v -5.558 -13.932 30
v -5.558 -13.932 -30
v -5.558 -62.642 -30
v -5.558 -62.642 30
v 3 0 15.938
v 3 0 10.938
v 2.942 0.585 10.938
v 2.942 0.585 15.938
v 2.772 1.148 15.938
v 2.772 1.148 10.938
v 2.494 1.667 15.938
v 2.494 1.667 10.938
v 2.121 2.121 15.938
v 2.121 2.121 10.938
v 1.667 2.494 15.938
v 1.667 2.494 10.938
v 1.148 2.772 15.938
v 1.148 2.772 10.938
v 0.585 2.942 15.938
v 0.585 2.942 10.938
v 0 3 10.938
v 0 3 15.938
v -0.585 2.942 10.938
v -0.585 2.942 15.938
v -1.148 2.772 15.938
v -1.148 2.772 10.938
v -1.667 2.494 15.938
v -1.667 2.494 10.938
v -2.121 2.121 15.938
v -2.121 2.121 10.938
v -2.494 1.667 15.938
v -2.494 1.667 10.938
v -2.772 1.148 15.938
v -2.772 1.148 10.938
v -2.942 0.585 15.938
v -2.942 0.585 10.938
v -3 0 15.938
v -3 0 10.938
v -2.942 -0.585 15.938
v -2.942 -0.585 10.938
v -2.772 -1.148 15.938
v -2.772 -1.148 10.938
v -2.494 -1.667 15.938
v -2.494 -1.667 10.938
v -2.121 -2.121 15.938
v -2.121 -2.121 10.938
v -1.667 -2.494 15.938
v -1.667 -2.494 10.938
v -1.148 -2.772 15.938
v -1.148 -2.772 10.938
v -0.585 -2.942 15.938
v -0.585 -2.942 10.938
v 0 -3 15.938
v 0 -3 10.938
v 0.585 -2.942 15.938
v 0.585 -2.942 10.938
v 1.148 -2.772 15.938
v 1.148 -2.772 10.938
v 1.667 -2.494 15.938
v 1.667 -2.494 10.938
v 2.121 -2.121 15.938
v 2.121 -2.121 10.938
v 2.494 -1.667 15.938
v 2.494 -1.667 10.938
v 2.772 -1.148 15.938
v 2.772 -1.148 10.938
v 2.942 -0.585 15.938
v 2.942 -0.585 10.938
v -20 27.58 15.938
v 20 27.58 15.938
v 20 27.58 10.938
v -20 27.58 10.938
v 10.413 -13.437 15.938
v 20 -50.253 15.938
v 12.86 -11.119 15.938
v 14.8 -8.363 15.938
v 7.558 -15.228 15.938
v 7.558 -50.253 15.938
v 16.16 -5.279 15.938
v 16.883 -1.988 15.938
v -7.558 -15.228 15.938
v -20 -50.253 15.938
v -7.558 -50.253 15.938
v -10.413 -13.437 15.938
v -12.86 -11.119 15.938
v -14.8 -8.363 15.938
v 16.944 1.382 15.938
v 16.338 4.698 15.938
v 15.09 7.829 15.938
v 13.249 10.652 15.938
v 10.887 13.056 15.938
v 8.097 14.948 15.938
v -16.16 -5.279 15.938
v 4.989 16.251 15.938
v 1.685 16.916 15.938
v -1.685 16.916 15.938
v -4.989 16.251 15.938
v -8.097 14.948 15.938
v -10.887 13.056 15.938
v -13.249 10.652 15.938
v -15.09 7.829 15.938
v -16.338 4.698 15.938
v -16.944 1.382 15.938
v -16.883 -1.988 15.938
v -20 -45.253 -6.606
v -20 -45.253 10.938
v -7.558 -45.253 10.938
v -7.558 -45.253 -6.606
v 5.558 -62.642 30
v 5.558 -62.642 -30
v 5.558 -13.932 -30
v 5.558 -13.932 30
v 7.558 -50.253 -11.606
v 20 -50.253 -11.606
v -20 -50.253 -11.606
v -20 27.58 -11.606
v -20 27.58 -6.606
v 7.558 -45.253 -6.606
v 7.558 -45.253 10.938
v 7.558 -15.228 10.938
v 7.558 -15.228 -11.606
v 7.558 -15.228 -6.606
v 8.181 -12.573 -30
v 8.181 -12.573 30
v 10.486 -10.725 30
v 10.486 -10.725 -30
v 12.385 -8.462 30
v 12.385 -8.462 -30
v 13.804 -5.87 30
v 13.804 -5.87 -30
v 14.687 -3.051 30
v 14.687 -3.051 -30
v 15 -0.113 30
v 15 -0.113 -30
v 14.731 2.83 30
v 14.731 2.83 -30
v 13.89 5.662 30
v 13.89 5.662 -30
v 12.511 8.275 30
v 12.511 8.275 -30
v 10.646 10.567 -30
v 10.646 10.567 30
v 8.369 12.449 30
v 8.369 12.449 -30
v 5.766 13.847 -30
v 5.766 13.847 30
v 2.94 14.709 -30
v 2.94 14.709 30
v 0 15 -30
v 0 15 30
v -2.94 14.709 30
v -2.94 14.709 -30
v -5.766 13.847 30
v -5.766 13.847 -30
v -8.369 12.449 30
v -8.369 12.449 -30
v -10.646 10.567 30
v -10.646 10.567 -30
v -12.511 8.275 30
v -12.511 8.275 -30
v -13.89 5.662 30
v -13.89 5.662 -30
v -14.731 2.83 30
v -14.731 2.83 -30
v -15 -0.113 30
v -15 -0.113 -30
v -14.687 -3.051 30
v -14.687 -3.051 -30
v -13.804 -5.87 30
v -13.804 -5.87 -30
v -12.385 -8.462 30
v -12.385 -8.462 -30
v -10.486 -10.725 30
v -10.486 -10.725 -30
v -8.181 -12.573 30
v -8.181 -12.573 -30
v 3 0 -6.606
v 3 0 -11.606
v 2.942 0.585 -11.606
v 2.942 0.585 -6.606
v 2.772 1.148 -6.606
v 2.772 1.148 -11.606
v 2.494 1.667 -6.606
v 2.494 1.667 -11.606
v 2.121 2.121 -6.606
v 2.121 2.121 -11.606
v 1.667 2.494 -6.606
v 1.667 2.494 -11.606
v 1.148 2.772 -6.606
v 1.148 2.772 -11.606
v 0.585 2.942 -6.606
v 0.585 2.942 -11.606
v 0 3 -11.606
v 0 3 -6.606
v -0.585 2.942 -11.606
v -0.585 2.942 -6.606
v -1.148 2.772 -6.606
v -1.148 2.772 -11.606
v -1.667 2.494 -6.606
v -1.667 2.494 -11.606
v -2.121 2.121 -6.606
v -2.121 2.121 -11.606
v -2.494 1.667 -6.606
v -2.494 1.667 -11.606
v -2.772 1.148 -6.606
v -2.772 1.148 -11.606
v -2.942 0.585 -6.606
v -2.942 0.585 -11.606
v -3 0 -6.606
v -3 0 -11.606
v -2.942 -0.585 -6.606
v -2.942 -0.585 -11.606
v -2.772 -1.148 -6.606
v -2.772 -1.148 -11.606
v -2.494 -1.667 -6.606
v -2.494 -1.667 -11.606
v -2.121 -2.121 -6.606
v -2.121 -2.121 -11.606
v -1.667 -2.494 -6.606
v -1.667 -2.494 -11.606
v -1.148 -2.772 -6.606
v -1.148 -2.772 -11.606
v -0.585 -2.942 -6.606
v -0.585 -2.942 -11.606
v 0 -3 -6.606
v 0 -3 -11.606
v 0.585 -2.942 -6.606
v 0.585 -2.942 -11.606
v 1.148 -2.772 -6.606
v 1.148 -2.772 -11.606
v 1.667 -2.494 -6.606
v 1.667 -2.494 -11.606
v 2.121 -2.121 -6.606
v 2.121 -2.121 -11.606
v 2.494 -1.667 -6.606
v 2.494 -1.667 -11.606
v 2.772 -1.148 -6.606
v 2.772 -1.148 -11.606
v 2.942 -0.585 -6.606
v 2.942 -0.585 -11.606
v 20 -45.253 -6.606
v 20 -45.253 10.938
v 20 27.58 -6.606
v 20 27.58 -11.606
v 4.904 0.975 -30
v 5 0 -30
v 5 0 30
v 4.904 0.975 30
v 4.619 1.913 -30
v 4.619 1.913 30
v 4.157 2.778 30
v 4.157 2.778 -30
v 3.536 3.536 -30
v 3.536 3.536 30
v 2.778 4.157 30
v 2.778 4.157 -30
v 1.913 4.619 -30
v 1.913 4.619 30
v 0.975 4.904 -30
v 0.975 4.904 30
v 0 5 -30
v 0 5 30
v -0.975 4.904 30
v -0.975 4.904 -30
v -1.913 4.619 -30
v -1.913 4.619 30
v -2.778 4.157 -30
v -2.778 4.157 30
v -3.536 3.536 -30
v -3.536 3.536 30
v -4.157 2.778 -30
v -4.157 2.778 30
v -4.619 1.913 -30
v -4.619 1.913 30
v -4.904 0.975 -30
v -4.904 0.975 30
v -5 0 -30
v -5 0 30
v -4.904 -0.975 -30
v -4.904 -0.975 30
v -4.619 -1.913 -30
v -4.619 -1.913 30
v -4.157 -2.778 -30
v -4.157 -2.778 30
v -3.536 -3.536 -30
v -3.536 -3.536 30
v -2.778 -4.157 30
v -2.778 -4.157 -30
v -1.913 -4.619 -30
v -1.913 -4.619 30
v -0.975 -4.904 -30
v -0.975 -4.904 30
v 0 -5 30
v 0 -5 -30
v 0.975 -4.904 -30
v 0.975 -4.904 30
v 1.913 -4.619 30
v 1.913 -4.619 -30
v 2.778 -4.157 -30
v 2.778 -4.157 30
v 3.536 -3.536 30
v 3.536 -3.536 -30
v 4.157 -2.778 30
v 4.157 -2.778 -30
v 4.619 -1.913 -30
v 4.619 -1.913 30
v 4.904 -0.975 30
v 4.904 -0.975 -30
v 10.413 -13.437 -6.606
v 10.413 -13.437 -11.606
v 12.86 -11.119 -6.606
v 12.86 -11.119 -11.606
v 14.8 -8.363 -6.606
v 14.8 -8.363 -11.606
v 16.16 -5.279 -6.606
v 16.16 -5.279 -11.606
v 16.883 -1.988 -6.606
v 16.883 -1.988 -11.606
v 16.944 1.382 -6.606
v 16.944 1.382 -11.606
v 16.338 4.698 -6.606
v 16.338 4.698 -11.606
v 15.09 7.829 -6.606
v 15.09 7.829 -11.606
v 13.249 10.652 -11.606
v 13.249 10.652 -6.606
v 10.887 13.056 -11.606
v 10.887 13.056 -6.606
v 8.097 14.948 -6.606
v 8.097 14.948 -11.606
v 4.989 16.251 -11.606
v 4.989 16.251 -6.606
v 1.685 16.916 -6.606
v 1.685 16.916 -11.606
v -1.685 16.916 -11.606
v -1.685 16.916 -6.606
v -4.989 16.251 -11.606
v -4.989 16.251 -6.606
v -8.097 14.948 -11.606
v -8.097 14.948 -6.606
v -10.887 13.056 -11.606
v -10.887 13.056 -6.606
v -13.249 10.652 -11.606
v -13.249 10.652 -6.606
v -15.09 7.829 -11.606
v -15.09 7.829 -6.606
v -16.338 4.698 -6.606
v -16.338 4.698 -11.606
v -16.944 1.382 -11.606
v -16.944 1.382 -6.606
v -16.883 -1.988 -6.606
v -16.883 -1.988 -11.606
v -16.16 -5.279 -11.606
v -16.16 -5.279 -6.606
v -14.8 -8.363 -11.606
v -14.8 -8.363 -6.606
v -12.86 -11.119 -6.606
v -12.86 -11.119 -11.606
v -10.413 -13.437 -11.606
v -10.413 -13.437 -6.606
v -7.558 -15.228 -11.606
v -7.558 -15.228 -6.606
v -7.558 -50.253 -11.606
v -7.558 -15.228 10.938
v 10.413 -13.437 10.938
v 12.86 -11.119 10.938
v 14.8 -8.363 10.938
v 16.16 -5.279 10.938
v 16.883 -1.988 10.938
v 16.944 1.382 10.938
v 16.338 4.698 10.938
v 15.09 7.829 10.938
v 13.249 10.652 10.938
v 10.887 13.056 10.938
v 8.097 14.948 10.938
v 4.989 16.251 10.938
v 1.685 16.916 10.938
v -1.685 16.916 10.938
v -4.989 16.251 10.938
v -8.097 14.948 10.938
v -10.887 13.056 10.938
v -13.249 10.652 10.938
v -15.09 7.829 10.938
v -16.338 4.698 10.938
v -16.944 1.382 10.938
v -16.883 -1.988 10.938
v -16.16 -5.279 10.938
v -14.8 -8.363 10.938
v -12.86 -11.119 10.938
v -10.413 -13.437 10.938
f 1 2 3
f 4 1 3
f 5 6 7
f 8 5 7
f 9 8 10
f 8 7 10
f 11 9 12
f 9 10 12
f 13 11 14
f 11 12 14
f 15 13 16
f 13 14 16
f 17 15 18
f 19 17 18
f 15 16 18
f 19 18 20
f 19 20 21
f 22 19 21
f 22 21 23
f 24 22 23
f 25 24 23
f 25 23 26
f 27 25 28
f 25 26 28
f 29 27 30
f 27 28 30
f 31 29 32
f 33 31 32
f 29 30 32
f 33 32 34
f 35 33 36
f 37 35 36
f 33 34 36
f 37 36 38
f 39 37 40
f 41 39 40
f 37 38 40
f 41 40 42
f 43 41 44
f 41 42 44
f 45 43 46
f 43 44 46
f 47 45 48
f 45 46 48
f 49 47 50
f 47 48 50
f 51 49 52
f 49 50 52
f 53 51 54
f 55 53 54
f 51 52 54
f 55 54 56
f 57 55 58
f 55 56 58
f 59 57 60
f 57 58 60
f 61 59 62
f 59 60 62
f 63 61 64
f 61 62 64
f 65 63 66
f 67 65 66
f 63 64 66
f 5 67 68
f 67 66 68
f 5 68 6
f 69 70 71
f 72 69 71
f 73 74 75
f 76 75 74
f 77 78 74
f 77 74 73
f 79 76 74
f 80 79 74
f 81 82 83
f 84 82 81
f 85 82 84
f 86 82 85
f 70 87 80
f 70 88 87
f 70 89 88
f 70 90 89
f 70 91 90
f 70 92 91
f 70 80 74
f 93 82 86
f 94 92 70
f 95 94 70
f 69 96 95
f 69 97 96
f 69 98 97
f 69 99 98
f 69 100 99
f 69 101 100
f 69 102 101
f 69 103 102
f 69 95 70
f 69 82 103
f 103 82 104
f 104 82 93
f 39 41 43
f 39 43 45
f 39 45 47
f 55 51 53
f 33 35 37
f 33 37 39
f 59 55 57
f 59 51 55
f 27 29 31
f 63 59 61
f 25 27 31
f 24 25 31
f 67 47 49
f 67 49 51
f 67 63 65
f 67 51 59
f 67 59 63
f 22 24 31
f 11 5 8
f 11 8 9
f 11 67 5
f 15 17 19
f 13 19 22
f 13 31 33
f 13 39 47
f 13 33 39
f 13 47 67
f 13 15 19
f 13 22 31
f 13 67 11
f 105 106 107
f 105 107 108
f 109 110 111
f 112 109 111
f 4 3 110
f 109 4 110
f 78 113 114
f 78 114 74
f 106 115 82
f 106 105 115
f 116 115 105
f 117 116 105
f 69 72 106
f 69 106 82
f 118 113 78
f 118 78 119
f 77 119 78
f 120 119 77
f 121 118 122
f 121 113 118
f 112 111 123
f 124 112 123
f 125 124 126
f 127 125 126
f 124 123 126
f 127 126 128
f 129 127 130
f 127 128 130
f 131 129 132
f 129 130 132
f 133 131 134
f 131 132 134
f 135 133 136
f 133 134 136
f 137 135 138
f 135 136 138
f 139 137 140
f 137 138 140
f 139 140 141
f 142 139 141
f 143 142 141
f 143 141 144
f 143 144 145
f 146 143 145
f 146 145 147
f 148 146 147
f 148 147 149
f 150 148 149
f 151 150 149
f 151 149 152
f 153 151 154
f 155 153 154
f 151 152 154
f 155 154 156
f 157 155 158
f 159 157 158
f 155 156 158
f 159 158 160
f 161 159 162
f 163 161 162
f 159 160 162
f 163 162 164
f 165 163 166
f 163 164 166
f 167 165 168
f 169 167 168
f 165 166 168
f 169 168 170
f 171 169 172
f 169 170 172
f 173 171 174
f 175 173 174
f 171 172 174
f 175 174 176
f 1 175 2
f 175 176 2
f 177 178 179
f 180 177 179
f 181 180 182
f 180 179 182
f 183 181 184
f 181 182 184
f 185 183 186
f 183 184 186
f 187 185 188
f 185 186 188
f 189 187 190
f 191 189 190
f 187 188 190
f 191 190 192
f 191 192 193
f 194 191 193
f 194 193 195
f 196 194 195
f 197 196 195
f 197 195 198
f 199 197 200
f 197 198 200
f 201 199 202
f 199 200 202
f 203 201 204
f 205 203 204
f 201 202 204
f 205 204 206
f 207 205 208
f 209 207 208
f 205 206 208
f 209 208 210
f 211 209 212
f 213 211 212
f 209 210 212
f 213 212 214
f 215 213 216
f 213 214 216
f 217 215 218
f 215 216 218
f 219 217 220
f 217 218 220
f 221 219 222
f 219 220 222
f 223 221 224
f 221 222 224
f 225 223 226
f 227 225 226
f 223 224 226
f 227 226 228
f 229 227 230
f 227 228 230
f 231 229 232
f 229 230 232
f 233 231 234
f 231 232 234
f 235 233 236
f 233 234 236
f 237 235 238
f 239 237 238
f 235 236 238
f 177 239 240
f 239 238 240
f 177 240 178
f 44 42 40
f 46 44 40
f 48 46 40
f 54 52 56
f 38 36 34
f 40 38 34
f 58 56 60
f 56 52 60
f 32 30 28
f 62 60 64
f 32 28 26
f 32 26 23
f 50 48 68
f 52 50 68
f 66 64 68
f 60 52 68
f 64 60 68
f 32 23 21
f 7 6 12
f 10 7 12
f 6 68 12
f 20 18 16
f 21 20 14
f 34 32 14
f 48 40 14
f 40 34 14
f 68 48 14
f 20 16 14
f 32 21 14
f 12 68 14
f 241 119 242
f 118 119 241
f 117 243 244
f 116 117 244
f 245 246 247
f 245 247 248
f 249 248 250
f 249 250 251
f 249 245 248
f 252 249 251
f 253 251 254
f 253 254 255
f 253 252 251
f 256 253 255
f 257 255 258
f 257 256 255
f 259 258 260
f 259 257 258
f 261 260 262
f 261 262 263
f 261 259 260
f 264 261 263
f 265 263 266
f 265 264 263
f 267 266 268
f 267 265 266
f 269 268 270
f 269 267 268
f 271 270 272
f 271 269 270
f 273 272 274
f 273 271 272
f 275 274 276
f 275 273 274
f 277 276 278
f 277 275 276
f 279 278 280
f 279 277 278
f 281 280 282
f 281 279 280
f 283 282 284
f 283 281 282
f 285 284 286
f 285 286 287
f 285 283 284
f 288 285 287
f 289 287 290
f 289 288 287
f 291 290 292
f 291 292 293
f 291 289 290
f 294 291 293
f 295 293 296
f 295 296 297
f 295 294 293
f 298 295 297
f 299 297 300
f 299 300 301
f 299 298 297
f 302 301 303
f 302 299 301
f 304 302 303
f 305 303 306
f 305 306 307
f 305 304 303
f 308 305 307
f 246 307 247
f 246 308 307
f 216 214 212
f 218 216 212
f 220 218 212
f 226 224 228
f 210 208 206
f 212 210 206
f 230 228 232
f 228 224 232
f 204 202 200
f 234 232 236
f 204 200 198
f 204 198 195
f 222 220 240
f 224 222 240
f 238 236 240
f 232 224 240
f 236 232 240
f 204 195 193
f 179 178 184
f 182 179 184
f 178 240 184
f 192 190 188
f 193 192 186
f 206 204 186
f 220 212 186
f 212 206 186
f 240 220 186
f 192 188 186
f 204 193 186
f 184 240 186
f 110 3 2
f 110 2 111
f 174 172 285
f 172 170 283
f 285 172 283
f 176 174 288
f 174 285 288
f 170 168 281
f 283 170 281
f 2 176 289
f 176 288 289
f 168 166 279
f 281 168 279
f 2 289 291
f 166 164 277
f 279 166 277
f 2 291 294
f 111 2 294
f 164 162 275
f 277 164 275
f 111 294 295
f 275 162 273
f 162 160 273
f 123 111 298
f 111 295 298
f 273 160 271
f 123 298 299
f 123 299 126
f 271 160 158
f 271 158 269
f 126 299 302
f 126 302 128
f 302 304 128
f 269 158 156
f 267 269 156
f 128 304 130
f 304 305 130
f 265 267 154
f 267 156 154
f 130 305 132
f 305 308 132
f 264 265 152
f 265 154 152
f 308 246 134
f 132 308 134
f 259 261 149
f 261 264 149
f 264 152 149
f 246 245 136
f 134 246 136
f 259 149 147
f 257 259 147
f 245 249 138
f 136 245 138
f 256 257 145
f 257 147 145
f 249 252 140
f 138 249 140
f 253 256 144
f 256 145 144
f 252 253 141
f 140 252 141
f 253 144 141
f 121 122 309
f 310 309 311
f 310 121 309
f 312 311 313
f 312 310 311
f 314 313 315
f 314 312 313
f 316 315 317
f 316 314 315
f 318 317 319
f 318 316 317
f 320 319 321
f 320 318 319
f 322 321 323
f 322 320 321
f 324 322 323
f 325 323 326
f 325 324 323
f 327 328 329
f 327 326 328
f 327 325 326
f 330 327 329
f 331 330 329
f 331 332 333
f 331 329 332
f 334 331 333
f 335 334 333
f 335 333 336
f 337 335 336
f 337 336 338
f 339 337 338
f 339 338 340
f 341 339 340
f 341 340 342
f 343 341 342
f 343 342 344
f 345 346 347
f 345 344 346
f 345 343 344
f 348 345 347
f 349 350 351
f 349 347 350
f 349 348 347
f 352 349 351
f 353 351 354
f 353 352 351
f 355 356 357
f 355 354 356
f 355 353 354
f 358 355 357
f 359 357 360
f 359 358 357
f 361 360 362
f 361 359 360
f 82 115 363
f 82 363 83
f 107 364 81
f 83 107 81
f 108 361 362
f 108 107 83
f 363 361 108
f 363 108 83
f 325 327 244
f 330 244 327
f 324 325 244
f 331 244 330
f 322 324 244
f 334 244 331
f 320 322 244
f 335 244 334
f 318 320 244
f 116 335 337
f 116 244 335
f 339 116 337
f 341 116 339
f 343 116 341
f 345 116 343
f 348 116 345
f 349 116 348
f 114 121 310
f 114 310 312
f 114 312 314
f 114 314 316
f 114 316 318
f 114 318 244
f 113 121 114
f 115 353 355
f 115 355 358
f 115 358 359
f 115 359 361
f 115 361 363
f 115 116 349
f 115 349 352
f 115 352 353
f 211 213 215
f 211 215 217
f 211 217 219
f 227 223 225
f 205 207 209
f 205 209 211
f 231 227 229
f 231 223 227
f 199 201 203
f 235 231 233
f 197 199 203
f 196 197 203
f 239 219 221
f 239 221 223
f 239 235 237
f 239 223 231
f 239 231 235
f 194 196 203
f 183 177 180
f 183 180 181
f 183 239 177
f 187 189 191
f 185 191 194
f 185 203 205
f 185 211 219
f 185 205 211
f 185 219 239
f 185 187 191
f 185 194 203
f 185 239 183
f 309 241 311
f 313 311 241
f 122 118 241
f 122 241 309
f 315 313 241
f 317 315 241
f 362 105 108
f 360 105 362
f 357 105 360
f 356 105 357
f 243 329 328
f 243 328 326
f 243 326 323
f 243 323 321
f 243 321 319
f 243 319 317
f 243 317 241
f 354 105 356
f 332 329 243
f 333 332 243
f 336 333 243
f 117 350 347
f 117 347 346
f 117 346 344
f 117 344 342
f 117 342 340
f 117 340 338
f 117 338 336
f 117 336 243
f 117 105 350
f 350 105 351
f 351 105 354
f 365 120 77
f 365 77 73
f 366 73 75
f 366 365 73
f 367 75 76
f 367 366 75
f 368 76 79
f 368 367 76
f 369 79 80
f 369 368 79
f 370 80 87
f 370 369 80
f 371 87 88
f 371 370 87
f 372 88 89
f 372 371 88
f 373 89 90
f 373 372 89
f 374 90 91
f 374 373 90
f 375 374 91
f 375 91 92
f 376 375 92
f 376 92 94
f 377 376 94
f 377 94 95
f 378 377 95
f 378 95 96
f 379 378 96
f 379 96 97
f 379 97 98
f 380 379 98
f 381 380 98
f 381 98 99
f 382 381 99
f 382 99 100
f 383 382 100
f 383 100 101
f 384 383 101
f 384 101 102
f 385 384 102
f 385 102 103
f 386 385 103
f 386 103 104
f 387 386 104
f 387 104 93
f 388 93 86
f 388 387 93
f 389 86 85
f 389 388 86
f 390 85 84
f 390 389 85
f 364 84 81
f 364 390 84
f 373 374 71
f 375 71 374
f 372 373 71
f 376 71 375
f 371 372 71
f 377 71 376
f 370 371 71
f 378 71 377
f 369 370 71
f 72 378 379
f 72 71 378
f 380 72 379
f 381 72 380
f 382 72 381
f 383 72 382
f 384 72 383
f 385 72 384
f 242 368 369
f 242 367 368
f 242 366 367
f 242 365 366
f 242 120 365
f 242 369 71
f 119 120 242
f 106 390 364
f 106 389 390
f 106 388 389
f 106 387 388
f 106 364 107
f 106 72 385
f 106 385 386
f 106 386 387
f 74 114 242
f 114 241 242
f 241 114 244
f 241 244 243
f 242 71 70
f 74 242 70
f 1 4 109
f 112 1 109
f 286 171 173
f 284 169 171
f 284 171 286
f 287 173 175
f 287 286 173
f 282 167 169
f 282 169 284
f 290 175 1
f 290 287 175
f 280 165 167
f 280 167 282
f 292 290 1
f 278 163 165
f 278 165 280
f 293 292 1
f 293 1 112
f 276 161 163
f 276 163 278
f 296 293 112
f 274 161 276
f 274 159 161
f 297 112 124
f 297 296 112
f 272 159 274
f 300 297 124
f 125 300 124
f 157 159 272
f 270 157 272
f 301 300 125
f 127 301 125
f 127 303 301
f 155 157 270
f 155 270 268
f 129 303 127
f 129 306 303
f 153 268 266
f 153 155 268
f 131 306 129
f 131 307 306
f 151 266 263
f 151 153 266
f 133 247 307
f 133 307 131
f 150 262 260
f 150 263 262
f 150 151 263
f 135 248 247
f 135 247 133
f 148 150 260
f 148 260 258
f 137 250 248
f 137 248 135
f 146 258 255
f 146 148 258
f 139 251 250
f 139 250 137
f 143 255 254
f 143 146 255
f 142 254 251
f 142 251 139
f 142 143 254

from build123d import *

# Parameters (mm, degrees)
EXTRUDE_5_DEPTH      = 30
EXTRUDE_5_DEPTH_BACK = 30
F_1_FR_R             = 5
EXTRUDE_6_DEPTH      = 20
EXTRUDE_6_DEPTH_BACK = 20
OTHER_START          = -11.605501957
OTHER_1_DEPTH        = 27.543632219
OTHER_START_2        = 10.938130262
OTHER_1_2_OUTLINE_R  = 3
OTHER_1_2_DEPTH      = 5
OTHER_1_3_OUTLINE_R  = 3
OTHER_1_3_DEPTH      = 5


# Read off the part's stored shape, not the designer's step: Отступ1
with BuildPart() as part:
    # Эскиз1_fr → Бобышка-Вытянуть5 (new, two sides: drawn at the far end of the back side and taken through both)
    with BuildSketch(Plane.XY.offset(-EXTRUDE_5_DEPTH_BACK)):
        with BuildLine():
            Line((-5.557606452, -13.932444528), (-5.557606452, -62.642280008))
            Line((-5.557606452, -62.642280008), (5.557606452, -62.642280008))
            Line((5.557606452, -62.642280008), (5.557606452, -13.932444528))
            ThreePointArc((5.557606452, -13.932444528), (0, 15), (-5.557606452, -13.932444528))
        make_face()
        Circle(F_1_FR_R, mode=Mode.SUBTRACT)
    extrude(amount=EXTRUDE_5_DEPTH + EXTRUDE_5_DEPTH_BACK)


with BuildPart() as body_2:
    # Эскиз3 → Бобышка-Вытянуть6 (new, two sides: drawn at the far end of the back side and taken through both)
    with BuildSketch(Plane(origin=(0, 0, 0), x_dir=(0, 0, -1), z_dir=(1, 0, 0)).offset(-EXTRUDE_6_DEPTH_BACK)):
        Polygon((-58.394498043, -50.25314581), (-85.938130262, -50.25314581), (-85.938130262, 27.580465306), (-80.938130262, 27.580465306), (-80.938130262, -45.25314581), (-63.394498043, -45.25314581), (-63.394498043, 27.580465306), (-58.394498043, 27.580465306), align=None)
    extrude(amount=EXTRUDE_6_DEPTH + EXTRUDE_6_DEPTH_BACK)


with BuildPart() as body_2_1:
    # Move Body 1: moved
    add(body_2.part.moved(Location((0, 0, -70))))

    # Отступ1 outline → Отступ1 (cut)
    with BuildSketch(Plane.XY.offset(OTHER_START)):
        with BuildLine():
            ThreePointArc((7.557606452, -15.227691378), (0, 17), (-7.557606452, -15.227691378))
            Line((-7.557606452, -15.227691378), (-7.557606452, -50.25314581))
            Line((-7.557606452, -50.25314581), (7.557606452, -50.25314581))
            Line((7.557606452, -50.25314581), (7.557606452, -15.227691378))
        make_face()
    extrude(amount=OTHER_1_DEPTH, mode=Mode.SUBTRACT)


with BuildPart() as body_3:
    # Other 1 2 outline → Other 1 2 (new body)
    with BuildSketch(Plane.XY.offset(OTHER_START_2)):
        Circle(OTHER_1_2_OUTLINE_R)
    extrude(amount=OTHER_1_2_DEPTH)


with BuildPart() as body_4:
    # Other 1 3 outline → Other 1 3 (new body)
    with BuildSketch(Plane.XY.offset(OTHER_START)):
        Circle(OTHER_1_3_OUTLINE_R)
    extrude(amount=OTHER_1_3_DEPTH)


solid = Compound([part.part, body_2_1.part, body_3.part, body_4.part])
